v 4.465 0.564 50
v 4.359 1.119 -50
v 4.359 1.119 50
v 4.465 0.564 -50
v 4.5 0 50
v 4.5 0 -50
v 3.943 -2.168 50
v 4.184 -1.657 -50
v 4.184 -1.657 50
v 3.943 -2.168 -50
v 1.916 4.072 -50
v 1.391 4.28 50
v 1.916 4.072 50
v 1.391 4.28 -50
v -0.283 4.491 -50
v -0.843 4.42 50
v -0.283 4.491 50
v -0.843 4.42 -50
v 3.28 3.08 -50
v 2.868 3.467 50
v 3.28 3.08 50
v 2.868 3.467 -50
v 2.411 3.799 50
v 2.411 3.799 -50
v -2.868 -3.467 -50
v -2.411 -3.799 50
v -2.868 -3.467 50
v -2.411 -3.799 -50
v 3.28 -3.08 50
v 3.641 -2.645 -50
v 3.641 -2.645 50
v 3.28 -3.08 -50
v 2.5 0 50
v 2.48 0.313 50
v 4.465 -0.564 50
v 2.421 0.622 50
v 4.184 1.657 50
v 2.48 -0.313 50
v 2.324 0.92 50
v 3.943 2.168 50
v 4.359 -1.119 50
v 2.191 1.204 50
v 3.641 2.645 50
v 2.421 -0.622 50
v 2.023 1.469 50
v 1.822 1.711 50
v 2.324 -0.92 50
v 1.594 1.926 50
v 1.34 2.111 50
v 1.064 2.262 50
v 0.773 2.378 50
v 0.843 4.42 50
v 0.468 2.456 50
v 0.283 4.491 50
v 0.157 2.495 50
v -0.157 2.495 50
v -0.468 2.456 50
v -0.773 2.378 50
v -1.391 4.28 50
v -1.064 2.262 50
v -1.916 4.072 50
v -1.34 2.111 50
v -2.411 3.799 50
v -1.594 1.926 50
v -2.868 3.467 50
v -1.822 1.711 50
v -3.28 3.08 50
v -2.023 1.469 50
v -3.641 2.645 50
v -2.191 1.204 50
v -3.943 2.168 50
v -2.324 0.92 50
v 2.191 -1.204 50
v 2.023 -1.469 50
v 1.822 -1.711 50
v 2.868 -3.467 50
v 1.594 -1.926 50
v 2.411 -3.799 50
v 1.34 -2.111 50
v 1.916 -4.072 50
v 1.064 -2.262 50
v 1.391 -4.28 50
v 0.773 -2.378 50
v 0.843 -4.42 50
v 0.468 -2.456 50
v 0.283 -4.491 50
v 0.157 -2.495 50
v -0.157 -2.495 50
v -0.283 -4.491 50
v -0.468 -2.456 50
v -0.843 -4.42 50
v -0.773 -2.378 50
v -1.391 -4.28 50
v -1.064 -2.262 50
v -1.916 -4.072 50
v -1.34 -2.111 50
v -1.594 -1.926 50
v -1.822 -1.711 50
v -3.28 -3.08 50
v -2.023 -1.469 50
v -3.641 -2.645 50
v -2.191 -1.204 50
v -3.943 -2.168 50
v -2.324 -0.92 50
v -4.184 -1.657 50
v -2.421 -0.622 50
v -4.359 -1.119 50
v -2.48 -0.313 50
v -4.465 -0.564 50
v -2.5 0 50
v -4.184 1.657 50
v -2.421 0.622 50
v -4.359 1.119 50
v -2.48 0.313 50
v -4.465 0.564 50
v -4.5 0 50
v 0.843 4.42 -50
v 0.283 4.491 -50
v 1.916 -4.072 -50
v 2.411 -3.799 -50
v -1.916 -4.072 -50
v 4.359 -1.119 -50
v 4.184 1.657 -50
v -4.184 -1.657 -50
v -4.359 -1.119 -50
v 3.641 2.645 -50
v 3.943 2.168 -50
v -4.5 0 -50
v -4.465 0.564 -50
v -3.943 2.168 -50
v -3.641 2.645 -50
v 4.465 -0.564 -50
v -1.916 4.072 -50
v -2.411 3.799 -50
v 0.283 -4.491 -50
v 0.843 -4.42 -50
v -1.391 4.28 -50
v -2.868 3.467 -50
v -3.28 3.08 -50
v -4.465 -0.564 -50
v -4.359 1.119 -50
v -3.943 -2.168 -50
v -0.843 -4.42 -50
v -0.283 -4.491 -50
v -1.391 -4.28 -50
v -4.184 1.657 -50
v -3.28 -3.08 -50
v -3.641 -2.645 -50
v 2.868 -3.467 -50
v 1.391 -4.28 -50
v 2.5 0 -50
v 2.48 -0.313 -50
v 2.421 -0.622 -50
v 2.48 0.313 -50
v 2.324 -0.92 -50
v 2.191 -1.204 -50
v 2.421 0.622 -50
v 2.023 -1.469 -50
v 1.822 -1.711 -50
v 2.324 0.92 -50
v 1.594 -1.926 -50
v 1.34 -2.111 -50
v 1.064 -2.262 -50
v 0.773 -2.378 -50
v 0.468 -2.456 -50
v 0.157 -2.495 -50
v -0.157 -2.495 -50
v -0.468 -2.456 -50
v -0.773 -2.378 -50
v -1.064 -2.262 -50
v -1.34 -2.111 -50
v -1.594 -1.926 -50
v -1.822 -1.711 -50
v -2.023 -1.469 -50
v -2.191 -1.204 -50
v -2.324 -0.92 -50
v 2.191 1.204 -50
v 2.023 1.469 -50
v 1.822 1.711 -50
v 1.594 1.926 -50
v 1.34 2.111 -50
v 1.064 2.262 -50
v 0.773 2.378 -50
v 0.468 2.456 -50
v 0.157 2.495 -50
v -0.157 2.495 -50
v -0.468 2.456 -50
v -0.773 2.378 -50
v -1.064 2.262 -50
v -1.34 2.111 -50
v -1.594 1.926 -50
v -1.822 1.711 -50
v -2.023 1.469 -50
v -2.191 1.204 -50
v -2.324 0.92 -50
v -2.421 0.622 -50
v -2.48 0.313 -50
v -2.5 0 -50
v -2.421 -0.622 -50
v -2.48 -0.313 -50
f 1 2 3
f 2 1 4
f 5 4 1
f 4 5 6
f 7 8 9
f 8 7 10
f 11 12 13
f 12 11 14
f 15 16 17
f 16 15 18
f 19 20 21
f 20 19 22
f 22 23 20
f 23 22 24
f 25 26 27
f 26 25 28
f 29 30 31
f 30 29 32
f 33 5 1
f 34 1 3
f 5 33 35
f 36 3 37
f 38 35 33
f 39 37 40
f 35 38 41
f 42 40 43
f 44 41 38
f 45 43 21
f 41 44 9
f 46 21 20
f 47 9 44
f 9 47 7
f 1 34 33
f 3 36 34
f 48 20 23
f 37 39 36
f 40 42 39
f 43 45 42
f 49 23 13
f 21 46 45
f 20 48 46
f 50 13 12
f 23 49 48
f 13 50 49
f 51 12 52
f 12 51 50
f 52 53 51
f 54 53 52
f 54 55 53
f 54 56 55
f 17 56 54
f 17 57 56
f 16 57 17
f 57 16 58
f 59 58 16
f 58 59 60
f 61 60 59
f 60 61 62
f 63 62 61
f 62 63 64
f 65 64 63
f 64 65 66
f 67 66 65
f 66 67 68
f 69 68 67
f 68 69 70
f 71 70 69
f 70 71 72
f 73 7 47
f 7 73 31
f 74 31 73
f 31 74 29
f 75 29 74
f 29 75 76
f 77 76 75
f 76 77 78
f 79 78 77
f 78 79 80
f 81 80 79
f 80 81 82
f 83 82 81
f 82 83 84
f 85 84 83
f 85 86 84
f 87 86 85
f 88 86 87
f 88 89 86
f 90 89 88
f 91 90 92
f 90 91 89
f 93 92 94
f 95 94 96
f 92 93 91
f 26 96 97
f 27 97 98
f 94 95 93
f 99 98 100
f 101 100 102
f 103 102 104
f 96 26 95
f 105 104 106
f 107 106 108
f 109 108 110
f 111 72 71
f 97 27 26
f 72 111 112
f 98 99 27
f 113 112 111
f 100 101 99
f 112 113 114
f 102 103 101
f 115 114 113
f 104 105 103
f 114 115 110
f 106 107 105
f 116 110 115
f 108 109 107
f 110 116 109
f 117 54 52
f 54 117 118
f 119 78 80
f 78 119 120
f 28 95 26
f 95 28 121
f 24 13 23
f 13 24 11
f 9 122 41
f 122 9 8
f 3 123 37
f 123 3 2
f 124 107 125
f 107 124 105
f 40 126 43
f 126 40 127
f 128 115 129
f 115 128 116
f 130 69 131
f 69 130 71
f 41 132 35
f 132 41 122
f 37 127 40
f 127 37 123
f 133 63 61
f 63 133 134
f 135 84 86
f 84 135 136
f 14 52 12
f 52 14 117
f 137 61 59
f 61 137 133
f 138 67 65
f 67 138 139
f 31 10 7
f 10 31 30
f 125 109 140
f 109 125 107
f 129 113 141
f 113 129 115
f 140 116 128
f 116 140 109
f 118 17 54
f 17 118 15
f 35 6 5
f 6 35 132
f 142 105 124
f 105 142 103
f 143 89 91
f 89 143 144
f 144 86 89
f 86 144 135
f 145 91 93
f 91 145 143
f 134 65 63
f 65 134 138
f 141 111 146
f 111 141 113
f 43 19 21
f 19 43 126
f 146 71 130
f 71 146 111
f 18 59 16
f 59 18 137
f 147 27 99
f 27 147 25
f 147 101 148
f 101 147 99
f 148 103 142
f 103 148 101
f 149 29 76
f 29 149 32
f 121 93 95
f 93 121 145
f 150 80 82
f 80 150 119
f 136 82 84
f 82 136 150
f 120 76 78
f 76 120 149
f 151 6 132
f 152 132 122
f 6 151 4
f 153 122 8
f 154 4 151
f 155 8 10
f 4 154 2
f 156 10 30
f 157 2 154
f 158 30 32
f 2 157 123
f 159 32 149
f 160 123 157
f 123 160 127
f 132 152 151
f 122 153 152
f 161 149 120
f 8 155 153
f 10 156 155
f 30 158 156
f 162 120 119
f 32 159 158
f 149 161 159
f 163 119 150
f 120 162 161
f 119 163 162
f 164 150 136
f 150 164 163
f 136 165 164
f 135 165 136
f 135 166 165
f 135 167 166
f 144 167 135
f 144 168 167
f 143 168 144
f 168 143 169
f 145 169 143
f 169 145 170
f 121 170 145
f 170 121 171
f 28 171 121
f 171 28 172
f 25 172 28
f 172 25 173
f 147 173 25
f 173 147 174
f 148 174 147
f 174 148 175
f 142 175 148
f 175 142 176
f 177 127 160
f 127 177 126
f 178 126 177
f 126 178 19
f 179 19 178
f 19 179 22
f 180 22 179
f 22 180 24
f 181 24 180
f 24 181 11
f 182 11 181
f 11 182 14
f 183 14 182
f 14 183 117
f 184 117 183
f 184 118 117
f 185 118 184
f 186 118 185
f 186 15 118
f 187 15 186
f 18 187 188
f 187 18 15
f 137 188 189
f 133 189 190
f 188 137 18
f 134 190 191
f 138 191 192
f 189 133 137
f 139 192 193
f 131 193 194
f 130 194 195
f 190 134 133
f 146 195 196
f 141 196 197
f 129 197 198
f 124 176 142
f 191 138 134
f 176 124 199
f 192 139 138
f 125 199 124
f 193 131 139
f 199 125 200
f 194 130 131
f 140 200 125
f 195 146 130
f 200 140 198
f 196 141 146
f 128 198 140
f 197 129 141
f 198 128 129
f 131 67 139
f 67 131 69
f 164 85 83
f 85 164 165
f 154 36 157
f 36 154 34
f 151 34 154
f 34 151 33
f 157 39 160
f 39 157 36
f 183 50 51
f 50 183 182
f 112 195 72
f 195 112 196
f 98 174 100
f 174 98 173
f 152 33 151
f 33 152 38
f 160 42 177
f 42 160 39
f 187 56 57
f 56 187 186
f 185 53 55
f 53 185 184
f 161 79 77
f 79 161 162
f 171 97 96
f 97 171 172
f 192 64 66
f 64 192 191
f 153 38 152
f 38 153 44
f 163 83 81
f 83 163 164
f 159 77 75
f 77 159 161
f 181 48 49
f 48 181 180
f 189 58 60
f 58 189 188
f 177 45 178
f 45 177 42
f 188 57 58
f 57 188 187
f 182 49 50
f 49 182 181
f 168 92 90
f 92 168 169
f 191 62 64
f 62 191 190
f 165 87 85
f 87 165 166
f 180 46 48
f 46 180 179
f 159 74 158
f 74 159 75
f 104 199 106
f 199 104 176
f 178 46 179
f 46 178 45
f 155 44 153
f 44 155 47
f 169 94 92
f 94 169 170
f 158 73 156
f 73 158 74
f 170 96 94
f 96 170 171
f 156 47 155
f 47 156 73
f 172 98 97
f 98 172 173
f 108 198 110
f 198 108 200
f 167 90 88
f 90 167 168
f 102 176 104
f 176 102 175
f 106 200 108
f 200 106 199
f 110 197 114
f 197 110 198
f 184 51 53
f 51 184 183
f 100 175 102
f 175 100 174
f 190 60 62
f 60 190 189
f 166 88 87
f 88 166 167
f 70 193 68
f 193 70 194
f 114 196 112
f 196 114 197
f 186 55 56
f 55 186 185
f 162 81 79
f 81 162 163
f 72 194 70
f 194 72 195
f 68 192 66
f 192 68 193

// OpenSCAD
$fn = 50;


difference() {
	union() {
		translate(v = [0, 0, -50.0000000000]) {
			cylinder(h = 100, r = 4.5000000000);
		}
	}
	union() {
		translate(v = [0, 0, -100.0000000000]) {
			cylinder(h = 200, r = 2.5000000000);
		}
	}
}
